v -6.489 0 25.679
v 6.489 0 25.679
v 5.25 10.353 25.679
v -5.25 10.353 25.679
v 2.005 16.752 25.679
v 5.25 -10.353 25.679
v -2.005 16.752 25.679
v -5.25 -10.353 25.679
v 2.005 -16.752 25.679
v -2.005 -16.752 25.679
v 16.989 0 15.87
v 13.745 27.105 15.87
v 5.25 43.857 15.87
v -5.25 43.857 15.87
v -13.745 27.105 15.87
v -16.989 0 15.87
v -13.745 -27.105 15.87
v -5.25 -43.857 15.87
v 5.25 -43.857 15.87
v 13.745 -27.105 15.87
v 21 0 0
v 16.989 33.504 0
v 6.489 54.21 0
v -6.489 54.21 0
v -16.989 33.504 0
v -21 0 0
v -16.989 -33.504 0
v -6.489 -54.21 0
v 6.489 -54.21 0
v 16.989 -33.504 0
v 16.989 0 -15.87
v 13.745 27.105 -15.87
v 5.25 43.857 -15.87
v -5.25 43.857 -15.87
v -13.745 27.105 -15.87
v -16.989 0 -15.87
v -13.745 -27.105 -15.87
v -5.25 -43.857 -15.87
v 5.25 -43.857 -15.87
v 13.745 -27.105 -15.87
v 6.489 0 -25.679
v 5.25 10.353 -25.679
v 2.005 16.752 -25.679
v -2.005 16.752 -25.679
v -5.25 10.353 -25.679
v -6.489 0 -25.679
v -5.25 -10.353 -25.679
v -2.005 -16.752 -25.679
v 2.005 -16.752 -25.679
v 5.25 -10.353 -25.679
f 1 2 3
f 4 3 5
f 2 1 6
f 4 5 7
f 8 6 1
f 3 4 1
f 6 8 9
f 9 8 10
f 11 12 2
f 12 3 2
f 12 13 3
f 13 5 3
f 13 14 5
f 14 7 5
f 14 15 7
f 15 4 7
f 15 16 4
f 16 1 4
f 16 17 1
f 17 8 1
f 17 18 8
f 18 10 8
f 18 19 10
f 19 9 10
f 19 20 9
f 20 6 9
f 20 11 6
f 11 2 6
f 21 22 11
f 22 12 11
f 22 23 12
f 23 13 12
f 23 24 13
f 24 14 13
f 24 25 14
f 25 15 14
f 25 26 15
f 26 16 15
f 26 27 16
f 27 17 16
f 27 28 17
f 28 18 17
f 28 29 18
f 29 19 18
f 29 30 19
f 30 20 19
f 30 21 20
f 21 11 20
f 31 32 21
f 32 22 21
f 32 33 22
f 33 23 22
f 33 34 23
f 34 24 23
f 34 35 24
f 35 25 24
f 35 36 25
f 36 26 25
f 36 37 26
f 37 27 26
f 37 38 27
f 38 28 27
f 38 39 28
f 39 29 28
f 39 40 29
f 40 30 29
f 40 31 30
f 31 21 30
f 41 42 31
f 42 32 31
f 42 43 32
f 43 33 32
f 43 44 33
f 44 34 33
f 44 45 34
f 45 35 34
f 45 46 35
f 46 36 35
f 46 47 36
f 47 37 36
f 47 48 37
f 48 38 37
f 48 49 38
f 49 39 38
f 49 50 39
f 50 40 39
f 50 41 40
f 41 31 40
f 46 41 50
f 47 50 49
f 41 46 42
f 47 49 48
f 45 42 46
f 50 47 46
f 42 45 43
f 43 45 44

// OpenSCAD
// Generated by SolidPython 1.0.1 on 2020-07-29 00:46:48


scale(v = [7, 19, 9]) {
	sphere(r = 3);
}
/***********************************************
*********      SolidPython code:      **********
************************************************
 
# import packages: SolidPython
from solid import *
from solid.utils import *
from itertools import chain, combinations, permutations


class Resize:

    def __init__(self, scad_file):
        self.scad_file = scad_file
        #self.scad_file = import_scad(scad_file)
        # cone/cylinder param:
        self.r1 = 0
        self.r2 = 0
        self.h = 0
        # rectangular prism param:
        self.w = 0
        self.l = 0
        # ellipse param:
        self.r = 0

    # import OpenScad code (file name corresponds to shape)


    # classify shape + parameters
    def assign(self, param1, param2, param3):
        if self.scad_file == 'cone.scad':
            self.r1 = param1
            self.r2 = param2
            self.h = param3
        elif self.scad_file == 'cylinder.scad':
            self.r1 = param1
            self.r2 = param2
            self.h = param3
        elif self.scad_file == 'rectangularPrism.scad':
            self.h = param1
            self.l = param2
            self.w = param3
        else:
            self.r = param1
            self.h = param2

    # resize parameters
    def iterate(self):
        x = range(3, 20, 2)
        i = 1
        if self.scad_file == 'cone.scad':
            tempList = list(permutations(x, 2))
            for temp in tempList:
                param1 = temp[0]
                param2 = temp[1]
                filepath = 'produced_scad_files/' + 'cone' + str(param1) + '_' + str(param2) + '_' + '.scad'
                scad_render_to_file(cylinder(h=param1, r1=param2, r2=0), filepath)

        elif self.scad_file == 'cylinder.scad':
            tempList = list(permutations(x, 3))
            for temp in tempList:
                param1 = temp[0]
                param2 = temp[1]
                filepath = 'produced_scad_files/' + 'cylinder' + str(param1) + '_' + str(param2) + '_' + '.scad'
                scad_render_to_file(cylinder(h=param1, r1=param2, r2=param2), filepath)

        elif self.scad_file == 'rectangularPrism.scad':
            tempList = list(permutations(x, 3))
            for temp in tempList:
                param1 = temp[0]
                param2 = temp[1]
                param3 = temp[2]
                filepath = 'produced_scad_files/' + 'rectangularPrism' + str(param1) + '_' + str(param2) + '_' + str(
                    param3) + '.scad'
                scad_render_to_file(cube(size=(param1, param2, param3)), filepath)

        elif self.scad_file == 'ellipse.scad':
            tempList = list(permutations(x, 4))
            for temp in tempList:
                param1 = temp[0]
                param2 = temp[1]
                param3 = temp[2]
                param4 = temp[3]
                filepath = 'produced_scad_files/' + 'ellipse' + str(param1) + '_' + str(param2) + '_' + str(param3) + '_' + str(param4) + '.scad'
                scad_render_to_file(scale([param1, param2, param3])(sphere(r=param4)), filepath)

    def render_to_scadfile(self):
        scad_render_to_file(scad, 'example.scad') 
 
************************************************/
